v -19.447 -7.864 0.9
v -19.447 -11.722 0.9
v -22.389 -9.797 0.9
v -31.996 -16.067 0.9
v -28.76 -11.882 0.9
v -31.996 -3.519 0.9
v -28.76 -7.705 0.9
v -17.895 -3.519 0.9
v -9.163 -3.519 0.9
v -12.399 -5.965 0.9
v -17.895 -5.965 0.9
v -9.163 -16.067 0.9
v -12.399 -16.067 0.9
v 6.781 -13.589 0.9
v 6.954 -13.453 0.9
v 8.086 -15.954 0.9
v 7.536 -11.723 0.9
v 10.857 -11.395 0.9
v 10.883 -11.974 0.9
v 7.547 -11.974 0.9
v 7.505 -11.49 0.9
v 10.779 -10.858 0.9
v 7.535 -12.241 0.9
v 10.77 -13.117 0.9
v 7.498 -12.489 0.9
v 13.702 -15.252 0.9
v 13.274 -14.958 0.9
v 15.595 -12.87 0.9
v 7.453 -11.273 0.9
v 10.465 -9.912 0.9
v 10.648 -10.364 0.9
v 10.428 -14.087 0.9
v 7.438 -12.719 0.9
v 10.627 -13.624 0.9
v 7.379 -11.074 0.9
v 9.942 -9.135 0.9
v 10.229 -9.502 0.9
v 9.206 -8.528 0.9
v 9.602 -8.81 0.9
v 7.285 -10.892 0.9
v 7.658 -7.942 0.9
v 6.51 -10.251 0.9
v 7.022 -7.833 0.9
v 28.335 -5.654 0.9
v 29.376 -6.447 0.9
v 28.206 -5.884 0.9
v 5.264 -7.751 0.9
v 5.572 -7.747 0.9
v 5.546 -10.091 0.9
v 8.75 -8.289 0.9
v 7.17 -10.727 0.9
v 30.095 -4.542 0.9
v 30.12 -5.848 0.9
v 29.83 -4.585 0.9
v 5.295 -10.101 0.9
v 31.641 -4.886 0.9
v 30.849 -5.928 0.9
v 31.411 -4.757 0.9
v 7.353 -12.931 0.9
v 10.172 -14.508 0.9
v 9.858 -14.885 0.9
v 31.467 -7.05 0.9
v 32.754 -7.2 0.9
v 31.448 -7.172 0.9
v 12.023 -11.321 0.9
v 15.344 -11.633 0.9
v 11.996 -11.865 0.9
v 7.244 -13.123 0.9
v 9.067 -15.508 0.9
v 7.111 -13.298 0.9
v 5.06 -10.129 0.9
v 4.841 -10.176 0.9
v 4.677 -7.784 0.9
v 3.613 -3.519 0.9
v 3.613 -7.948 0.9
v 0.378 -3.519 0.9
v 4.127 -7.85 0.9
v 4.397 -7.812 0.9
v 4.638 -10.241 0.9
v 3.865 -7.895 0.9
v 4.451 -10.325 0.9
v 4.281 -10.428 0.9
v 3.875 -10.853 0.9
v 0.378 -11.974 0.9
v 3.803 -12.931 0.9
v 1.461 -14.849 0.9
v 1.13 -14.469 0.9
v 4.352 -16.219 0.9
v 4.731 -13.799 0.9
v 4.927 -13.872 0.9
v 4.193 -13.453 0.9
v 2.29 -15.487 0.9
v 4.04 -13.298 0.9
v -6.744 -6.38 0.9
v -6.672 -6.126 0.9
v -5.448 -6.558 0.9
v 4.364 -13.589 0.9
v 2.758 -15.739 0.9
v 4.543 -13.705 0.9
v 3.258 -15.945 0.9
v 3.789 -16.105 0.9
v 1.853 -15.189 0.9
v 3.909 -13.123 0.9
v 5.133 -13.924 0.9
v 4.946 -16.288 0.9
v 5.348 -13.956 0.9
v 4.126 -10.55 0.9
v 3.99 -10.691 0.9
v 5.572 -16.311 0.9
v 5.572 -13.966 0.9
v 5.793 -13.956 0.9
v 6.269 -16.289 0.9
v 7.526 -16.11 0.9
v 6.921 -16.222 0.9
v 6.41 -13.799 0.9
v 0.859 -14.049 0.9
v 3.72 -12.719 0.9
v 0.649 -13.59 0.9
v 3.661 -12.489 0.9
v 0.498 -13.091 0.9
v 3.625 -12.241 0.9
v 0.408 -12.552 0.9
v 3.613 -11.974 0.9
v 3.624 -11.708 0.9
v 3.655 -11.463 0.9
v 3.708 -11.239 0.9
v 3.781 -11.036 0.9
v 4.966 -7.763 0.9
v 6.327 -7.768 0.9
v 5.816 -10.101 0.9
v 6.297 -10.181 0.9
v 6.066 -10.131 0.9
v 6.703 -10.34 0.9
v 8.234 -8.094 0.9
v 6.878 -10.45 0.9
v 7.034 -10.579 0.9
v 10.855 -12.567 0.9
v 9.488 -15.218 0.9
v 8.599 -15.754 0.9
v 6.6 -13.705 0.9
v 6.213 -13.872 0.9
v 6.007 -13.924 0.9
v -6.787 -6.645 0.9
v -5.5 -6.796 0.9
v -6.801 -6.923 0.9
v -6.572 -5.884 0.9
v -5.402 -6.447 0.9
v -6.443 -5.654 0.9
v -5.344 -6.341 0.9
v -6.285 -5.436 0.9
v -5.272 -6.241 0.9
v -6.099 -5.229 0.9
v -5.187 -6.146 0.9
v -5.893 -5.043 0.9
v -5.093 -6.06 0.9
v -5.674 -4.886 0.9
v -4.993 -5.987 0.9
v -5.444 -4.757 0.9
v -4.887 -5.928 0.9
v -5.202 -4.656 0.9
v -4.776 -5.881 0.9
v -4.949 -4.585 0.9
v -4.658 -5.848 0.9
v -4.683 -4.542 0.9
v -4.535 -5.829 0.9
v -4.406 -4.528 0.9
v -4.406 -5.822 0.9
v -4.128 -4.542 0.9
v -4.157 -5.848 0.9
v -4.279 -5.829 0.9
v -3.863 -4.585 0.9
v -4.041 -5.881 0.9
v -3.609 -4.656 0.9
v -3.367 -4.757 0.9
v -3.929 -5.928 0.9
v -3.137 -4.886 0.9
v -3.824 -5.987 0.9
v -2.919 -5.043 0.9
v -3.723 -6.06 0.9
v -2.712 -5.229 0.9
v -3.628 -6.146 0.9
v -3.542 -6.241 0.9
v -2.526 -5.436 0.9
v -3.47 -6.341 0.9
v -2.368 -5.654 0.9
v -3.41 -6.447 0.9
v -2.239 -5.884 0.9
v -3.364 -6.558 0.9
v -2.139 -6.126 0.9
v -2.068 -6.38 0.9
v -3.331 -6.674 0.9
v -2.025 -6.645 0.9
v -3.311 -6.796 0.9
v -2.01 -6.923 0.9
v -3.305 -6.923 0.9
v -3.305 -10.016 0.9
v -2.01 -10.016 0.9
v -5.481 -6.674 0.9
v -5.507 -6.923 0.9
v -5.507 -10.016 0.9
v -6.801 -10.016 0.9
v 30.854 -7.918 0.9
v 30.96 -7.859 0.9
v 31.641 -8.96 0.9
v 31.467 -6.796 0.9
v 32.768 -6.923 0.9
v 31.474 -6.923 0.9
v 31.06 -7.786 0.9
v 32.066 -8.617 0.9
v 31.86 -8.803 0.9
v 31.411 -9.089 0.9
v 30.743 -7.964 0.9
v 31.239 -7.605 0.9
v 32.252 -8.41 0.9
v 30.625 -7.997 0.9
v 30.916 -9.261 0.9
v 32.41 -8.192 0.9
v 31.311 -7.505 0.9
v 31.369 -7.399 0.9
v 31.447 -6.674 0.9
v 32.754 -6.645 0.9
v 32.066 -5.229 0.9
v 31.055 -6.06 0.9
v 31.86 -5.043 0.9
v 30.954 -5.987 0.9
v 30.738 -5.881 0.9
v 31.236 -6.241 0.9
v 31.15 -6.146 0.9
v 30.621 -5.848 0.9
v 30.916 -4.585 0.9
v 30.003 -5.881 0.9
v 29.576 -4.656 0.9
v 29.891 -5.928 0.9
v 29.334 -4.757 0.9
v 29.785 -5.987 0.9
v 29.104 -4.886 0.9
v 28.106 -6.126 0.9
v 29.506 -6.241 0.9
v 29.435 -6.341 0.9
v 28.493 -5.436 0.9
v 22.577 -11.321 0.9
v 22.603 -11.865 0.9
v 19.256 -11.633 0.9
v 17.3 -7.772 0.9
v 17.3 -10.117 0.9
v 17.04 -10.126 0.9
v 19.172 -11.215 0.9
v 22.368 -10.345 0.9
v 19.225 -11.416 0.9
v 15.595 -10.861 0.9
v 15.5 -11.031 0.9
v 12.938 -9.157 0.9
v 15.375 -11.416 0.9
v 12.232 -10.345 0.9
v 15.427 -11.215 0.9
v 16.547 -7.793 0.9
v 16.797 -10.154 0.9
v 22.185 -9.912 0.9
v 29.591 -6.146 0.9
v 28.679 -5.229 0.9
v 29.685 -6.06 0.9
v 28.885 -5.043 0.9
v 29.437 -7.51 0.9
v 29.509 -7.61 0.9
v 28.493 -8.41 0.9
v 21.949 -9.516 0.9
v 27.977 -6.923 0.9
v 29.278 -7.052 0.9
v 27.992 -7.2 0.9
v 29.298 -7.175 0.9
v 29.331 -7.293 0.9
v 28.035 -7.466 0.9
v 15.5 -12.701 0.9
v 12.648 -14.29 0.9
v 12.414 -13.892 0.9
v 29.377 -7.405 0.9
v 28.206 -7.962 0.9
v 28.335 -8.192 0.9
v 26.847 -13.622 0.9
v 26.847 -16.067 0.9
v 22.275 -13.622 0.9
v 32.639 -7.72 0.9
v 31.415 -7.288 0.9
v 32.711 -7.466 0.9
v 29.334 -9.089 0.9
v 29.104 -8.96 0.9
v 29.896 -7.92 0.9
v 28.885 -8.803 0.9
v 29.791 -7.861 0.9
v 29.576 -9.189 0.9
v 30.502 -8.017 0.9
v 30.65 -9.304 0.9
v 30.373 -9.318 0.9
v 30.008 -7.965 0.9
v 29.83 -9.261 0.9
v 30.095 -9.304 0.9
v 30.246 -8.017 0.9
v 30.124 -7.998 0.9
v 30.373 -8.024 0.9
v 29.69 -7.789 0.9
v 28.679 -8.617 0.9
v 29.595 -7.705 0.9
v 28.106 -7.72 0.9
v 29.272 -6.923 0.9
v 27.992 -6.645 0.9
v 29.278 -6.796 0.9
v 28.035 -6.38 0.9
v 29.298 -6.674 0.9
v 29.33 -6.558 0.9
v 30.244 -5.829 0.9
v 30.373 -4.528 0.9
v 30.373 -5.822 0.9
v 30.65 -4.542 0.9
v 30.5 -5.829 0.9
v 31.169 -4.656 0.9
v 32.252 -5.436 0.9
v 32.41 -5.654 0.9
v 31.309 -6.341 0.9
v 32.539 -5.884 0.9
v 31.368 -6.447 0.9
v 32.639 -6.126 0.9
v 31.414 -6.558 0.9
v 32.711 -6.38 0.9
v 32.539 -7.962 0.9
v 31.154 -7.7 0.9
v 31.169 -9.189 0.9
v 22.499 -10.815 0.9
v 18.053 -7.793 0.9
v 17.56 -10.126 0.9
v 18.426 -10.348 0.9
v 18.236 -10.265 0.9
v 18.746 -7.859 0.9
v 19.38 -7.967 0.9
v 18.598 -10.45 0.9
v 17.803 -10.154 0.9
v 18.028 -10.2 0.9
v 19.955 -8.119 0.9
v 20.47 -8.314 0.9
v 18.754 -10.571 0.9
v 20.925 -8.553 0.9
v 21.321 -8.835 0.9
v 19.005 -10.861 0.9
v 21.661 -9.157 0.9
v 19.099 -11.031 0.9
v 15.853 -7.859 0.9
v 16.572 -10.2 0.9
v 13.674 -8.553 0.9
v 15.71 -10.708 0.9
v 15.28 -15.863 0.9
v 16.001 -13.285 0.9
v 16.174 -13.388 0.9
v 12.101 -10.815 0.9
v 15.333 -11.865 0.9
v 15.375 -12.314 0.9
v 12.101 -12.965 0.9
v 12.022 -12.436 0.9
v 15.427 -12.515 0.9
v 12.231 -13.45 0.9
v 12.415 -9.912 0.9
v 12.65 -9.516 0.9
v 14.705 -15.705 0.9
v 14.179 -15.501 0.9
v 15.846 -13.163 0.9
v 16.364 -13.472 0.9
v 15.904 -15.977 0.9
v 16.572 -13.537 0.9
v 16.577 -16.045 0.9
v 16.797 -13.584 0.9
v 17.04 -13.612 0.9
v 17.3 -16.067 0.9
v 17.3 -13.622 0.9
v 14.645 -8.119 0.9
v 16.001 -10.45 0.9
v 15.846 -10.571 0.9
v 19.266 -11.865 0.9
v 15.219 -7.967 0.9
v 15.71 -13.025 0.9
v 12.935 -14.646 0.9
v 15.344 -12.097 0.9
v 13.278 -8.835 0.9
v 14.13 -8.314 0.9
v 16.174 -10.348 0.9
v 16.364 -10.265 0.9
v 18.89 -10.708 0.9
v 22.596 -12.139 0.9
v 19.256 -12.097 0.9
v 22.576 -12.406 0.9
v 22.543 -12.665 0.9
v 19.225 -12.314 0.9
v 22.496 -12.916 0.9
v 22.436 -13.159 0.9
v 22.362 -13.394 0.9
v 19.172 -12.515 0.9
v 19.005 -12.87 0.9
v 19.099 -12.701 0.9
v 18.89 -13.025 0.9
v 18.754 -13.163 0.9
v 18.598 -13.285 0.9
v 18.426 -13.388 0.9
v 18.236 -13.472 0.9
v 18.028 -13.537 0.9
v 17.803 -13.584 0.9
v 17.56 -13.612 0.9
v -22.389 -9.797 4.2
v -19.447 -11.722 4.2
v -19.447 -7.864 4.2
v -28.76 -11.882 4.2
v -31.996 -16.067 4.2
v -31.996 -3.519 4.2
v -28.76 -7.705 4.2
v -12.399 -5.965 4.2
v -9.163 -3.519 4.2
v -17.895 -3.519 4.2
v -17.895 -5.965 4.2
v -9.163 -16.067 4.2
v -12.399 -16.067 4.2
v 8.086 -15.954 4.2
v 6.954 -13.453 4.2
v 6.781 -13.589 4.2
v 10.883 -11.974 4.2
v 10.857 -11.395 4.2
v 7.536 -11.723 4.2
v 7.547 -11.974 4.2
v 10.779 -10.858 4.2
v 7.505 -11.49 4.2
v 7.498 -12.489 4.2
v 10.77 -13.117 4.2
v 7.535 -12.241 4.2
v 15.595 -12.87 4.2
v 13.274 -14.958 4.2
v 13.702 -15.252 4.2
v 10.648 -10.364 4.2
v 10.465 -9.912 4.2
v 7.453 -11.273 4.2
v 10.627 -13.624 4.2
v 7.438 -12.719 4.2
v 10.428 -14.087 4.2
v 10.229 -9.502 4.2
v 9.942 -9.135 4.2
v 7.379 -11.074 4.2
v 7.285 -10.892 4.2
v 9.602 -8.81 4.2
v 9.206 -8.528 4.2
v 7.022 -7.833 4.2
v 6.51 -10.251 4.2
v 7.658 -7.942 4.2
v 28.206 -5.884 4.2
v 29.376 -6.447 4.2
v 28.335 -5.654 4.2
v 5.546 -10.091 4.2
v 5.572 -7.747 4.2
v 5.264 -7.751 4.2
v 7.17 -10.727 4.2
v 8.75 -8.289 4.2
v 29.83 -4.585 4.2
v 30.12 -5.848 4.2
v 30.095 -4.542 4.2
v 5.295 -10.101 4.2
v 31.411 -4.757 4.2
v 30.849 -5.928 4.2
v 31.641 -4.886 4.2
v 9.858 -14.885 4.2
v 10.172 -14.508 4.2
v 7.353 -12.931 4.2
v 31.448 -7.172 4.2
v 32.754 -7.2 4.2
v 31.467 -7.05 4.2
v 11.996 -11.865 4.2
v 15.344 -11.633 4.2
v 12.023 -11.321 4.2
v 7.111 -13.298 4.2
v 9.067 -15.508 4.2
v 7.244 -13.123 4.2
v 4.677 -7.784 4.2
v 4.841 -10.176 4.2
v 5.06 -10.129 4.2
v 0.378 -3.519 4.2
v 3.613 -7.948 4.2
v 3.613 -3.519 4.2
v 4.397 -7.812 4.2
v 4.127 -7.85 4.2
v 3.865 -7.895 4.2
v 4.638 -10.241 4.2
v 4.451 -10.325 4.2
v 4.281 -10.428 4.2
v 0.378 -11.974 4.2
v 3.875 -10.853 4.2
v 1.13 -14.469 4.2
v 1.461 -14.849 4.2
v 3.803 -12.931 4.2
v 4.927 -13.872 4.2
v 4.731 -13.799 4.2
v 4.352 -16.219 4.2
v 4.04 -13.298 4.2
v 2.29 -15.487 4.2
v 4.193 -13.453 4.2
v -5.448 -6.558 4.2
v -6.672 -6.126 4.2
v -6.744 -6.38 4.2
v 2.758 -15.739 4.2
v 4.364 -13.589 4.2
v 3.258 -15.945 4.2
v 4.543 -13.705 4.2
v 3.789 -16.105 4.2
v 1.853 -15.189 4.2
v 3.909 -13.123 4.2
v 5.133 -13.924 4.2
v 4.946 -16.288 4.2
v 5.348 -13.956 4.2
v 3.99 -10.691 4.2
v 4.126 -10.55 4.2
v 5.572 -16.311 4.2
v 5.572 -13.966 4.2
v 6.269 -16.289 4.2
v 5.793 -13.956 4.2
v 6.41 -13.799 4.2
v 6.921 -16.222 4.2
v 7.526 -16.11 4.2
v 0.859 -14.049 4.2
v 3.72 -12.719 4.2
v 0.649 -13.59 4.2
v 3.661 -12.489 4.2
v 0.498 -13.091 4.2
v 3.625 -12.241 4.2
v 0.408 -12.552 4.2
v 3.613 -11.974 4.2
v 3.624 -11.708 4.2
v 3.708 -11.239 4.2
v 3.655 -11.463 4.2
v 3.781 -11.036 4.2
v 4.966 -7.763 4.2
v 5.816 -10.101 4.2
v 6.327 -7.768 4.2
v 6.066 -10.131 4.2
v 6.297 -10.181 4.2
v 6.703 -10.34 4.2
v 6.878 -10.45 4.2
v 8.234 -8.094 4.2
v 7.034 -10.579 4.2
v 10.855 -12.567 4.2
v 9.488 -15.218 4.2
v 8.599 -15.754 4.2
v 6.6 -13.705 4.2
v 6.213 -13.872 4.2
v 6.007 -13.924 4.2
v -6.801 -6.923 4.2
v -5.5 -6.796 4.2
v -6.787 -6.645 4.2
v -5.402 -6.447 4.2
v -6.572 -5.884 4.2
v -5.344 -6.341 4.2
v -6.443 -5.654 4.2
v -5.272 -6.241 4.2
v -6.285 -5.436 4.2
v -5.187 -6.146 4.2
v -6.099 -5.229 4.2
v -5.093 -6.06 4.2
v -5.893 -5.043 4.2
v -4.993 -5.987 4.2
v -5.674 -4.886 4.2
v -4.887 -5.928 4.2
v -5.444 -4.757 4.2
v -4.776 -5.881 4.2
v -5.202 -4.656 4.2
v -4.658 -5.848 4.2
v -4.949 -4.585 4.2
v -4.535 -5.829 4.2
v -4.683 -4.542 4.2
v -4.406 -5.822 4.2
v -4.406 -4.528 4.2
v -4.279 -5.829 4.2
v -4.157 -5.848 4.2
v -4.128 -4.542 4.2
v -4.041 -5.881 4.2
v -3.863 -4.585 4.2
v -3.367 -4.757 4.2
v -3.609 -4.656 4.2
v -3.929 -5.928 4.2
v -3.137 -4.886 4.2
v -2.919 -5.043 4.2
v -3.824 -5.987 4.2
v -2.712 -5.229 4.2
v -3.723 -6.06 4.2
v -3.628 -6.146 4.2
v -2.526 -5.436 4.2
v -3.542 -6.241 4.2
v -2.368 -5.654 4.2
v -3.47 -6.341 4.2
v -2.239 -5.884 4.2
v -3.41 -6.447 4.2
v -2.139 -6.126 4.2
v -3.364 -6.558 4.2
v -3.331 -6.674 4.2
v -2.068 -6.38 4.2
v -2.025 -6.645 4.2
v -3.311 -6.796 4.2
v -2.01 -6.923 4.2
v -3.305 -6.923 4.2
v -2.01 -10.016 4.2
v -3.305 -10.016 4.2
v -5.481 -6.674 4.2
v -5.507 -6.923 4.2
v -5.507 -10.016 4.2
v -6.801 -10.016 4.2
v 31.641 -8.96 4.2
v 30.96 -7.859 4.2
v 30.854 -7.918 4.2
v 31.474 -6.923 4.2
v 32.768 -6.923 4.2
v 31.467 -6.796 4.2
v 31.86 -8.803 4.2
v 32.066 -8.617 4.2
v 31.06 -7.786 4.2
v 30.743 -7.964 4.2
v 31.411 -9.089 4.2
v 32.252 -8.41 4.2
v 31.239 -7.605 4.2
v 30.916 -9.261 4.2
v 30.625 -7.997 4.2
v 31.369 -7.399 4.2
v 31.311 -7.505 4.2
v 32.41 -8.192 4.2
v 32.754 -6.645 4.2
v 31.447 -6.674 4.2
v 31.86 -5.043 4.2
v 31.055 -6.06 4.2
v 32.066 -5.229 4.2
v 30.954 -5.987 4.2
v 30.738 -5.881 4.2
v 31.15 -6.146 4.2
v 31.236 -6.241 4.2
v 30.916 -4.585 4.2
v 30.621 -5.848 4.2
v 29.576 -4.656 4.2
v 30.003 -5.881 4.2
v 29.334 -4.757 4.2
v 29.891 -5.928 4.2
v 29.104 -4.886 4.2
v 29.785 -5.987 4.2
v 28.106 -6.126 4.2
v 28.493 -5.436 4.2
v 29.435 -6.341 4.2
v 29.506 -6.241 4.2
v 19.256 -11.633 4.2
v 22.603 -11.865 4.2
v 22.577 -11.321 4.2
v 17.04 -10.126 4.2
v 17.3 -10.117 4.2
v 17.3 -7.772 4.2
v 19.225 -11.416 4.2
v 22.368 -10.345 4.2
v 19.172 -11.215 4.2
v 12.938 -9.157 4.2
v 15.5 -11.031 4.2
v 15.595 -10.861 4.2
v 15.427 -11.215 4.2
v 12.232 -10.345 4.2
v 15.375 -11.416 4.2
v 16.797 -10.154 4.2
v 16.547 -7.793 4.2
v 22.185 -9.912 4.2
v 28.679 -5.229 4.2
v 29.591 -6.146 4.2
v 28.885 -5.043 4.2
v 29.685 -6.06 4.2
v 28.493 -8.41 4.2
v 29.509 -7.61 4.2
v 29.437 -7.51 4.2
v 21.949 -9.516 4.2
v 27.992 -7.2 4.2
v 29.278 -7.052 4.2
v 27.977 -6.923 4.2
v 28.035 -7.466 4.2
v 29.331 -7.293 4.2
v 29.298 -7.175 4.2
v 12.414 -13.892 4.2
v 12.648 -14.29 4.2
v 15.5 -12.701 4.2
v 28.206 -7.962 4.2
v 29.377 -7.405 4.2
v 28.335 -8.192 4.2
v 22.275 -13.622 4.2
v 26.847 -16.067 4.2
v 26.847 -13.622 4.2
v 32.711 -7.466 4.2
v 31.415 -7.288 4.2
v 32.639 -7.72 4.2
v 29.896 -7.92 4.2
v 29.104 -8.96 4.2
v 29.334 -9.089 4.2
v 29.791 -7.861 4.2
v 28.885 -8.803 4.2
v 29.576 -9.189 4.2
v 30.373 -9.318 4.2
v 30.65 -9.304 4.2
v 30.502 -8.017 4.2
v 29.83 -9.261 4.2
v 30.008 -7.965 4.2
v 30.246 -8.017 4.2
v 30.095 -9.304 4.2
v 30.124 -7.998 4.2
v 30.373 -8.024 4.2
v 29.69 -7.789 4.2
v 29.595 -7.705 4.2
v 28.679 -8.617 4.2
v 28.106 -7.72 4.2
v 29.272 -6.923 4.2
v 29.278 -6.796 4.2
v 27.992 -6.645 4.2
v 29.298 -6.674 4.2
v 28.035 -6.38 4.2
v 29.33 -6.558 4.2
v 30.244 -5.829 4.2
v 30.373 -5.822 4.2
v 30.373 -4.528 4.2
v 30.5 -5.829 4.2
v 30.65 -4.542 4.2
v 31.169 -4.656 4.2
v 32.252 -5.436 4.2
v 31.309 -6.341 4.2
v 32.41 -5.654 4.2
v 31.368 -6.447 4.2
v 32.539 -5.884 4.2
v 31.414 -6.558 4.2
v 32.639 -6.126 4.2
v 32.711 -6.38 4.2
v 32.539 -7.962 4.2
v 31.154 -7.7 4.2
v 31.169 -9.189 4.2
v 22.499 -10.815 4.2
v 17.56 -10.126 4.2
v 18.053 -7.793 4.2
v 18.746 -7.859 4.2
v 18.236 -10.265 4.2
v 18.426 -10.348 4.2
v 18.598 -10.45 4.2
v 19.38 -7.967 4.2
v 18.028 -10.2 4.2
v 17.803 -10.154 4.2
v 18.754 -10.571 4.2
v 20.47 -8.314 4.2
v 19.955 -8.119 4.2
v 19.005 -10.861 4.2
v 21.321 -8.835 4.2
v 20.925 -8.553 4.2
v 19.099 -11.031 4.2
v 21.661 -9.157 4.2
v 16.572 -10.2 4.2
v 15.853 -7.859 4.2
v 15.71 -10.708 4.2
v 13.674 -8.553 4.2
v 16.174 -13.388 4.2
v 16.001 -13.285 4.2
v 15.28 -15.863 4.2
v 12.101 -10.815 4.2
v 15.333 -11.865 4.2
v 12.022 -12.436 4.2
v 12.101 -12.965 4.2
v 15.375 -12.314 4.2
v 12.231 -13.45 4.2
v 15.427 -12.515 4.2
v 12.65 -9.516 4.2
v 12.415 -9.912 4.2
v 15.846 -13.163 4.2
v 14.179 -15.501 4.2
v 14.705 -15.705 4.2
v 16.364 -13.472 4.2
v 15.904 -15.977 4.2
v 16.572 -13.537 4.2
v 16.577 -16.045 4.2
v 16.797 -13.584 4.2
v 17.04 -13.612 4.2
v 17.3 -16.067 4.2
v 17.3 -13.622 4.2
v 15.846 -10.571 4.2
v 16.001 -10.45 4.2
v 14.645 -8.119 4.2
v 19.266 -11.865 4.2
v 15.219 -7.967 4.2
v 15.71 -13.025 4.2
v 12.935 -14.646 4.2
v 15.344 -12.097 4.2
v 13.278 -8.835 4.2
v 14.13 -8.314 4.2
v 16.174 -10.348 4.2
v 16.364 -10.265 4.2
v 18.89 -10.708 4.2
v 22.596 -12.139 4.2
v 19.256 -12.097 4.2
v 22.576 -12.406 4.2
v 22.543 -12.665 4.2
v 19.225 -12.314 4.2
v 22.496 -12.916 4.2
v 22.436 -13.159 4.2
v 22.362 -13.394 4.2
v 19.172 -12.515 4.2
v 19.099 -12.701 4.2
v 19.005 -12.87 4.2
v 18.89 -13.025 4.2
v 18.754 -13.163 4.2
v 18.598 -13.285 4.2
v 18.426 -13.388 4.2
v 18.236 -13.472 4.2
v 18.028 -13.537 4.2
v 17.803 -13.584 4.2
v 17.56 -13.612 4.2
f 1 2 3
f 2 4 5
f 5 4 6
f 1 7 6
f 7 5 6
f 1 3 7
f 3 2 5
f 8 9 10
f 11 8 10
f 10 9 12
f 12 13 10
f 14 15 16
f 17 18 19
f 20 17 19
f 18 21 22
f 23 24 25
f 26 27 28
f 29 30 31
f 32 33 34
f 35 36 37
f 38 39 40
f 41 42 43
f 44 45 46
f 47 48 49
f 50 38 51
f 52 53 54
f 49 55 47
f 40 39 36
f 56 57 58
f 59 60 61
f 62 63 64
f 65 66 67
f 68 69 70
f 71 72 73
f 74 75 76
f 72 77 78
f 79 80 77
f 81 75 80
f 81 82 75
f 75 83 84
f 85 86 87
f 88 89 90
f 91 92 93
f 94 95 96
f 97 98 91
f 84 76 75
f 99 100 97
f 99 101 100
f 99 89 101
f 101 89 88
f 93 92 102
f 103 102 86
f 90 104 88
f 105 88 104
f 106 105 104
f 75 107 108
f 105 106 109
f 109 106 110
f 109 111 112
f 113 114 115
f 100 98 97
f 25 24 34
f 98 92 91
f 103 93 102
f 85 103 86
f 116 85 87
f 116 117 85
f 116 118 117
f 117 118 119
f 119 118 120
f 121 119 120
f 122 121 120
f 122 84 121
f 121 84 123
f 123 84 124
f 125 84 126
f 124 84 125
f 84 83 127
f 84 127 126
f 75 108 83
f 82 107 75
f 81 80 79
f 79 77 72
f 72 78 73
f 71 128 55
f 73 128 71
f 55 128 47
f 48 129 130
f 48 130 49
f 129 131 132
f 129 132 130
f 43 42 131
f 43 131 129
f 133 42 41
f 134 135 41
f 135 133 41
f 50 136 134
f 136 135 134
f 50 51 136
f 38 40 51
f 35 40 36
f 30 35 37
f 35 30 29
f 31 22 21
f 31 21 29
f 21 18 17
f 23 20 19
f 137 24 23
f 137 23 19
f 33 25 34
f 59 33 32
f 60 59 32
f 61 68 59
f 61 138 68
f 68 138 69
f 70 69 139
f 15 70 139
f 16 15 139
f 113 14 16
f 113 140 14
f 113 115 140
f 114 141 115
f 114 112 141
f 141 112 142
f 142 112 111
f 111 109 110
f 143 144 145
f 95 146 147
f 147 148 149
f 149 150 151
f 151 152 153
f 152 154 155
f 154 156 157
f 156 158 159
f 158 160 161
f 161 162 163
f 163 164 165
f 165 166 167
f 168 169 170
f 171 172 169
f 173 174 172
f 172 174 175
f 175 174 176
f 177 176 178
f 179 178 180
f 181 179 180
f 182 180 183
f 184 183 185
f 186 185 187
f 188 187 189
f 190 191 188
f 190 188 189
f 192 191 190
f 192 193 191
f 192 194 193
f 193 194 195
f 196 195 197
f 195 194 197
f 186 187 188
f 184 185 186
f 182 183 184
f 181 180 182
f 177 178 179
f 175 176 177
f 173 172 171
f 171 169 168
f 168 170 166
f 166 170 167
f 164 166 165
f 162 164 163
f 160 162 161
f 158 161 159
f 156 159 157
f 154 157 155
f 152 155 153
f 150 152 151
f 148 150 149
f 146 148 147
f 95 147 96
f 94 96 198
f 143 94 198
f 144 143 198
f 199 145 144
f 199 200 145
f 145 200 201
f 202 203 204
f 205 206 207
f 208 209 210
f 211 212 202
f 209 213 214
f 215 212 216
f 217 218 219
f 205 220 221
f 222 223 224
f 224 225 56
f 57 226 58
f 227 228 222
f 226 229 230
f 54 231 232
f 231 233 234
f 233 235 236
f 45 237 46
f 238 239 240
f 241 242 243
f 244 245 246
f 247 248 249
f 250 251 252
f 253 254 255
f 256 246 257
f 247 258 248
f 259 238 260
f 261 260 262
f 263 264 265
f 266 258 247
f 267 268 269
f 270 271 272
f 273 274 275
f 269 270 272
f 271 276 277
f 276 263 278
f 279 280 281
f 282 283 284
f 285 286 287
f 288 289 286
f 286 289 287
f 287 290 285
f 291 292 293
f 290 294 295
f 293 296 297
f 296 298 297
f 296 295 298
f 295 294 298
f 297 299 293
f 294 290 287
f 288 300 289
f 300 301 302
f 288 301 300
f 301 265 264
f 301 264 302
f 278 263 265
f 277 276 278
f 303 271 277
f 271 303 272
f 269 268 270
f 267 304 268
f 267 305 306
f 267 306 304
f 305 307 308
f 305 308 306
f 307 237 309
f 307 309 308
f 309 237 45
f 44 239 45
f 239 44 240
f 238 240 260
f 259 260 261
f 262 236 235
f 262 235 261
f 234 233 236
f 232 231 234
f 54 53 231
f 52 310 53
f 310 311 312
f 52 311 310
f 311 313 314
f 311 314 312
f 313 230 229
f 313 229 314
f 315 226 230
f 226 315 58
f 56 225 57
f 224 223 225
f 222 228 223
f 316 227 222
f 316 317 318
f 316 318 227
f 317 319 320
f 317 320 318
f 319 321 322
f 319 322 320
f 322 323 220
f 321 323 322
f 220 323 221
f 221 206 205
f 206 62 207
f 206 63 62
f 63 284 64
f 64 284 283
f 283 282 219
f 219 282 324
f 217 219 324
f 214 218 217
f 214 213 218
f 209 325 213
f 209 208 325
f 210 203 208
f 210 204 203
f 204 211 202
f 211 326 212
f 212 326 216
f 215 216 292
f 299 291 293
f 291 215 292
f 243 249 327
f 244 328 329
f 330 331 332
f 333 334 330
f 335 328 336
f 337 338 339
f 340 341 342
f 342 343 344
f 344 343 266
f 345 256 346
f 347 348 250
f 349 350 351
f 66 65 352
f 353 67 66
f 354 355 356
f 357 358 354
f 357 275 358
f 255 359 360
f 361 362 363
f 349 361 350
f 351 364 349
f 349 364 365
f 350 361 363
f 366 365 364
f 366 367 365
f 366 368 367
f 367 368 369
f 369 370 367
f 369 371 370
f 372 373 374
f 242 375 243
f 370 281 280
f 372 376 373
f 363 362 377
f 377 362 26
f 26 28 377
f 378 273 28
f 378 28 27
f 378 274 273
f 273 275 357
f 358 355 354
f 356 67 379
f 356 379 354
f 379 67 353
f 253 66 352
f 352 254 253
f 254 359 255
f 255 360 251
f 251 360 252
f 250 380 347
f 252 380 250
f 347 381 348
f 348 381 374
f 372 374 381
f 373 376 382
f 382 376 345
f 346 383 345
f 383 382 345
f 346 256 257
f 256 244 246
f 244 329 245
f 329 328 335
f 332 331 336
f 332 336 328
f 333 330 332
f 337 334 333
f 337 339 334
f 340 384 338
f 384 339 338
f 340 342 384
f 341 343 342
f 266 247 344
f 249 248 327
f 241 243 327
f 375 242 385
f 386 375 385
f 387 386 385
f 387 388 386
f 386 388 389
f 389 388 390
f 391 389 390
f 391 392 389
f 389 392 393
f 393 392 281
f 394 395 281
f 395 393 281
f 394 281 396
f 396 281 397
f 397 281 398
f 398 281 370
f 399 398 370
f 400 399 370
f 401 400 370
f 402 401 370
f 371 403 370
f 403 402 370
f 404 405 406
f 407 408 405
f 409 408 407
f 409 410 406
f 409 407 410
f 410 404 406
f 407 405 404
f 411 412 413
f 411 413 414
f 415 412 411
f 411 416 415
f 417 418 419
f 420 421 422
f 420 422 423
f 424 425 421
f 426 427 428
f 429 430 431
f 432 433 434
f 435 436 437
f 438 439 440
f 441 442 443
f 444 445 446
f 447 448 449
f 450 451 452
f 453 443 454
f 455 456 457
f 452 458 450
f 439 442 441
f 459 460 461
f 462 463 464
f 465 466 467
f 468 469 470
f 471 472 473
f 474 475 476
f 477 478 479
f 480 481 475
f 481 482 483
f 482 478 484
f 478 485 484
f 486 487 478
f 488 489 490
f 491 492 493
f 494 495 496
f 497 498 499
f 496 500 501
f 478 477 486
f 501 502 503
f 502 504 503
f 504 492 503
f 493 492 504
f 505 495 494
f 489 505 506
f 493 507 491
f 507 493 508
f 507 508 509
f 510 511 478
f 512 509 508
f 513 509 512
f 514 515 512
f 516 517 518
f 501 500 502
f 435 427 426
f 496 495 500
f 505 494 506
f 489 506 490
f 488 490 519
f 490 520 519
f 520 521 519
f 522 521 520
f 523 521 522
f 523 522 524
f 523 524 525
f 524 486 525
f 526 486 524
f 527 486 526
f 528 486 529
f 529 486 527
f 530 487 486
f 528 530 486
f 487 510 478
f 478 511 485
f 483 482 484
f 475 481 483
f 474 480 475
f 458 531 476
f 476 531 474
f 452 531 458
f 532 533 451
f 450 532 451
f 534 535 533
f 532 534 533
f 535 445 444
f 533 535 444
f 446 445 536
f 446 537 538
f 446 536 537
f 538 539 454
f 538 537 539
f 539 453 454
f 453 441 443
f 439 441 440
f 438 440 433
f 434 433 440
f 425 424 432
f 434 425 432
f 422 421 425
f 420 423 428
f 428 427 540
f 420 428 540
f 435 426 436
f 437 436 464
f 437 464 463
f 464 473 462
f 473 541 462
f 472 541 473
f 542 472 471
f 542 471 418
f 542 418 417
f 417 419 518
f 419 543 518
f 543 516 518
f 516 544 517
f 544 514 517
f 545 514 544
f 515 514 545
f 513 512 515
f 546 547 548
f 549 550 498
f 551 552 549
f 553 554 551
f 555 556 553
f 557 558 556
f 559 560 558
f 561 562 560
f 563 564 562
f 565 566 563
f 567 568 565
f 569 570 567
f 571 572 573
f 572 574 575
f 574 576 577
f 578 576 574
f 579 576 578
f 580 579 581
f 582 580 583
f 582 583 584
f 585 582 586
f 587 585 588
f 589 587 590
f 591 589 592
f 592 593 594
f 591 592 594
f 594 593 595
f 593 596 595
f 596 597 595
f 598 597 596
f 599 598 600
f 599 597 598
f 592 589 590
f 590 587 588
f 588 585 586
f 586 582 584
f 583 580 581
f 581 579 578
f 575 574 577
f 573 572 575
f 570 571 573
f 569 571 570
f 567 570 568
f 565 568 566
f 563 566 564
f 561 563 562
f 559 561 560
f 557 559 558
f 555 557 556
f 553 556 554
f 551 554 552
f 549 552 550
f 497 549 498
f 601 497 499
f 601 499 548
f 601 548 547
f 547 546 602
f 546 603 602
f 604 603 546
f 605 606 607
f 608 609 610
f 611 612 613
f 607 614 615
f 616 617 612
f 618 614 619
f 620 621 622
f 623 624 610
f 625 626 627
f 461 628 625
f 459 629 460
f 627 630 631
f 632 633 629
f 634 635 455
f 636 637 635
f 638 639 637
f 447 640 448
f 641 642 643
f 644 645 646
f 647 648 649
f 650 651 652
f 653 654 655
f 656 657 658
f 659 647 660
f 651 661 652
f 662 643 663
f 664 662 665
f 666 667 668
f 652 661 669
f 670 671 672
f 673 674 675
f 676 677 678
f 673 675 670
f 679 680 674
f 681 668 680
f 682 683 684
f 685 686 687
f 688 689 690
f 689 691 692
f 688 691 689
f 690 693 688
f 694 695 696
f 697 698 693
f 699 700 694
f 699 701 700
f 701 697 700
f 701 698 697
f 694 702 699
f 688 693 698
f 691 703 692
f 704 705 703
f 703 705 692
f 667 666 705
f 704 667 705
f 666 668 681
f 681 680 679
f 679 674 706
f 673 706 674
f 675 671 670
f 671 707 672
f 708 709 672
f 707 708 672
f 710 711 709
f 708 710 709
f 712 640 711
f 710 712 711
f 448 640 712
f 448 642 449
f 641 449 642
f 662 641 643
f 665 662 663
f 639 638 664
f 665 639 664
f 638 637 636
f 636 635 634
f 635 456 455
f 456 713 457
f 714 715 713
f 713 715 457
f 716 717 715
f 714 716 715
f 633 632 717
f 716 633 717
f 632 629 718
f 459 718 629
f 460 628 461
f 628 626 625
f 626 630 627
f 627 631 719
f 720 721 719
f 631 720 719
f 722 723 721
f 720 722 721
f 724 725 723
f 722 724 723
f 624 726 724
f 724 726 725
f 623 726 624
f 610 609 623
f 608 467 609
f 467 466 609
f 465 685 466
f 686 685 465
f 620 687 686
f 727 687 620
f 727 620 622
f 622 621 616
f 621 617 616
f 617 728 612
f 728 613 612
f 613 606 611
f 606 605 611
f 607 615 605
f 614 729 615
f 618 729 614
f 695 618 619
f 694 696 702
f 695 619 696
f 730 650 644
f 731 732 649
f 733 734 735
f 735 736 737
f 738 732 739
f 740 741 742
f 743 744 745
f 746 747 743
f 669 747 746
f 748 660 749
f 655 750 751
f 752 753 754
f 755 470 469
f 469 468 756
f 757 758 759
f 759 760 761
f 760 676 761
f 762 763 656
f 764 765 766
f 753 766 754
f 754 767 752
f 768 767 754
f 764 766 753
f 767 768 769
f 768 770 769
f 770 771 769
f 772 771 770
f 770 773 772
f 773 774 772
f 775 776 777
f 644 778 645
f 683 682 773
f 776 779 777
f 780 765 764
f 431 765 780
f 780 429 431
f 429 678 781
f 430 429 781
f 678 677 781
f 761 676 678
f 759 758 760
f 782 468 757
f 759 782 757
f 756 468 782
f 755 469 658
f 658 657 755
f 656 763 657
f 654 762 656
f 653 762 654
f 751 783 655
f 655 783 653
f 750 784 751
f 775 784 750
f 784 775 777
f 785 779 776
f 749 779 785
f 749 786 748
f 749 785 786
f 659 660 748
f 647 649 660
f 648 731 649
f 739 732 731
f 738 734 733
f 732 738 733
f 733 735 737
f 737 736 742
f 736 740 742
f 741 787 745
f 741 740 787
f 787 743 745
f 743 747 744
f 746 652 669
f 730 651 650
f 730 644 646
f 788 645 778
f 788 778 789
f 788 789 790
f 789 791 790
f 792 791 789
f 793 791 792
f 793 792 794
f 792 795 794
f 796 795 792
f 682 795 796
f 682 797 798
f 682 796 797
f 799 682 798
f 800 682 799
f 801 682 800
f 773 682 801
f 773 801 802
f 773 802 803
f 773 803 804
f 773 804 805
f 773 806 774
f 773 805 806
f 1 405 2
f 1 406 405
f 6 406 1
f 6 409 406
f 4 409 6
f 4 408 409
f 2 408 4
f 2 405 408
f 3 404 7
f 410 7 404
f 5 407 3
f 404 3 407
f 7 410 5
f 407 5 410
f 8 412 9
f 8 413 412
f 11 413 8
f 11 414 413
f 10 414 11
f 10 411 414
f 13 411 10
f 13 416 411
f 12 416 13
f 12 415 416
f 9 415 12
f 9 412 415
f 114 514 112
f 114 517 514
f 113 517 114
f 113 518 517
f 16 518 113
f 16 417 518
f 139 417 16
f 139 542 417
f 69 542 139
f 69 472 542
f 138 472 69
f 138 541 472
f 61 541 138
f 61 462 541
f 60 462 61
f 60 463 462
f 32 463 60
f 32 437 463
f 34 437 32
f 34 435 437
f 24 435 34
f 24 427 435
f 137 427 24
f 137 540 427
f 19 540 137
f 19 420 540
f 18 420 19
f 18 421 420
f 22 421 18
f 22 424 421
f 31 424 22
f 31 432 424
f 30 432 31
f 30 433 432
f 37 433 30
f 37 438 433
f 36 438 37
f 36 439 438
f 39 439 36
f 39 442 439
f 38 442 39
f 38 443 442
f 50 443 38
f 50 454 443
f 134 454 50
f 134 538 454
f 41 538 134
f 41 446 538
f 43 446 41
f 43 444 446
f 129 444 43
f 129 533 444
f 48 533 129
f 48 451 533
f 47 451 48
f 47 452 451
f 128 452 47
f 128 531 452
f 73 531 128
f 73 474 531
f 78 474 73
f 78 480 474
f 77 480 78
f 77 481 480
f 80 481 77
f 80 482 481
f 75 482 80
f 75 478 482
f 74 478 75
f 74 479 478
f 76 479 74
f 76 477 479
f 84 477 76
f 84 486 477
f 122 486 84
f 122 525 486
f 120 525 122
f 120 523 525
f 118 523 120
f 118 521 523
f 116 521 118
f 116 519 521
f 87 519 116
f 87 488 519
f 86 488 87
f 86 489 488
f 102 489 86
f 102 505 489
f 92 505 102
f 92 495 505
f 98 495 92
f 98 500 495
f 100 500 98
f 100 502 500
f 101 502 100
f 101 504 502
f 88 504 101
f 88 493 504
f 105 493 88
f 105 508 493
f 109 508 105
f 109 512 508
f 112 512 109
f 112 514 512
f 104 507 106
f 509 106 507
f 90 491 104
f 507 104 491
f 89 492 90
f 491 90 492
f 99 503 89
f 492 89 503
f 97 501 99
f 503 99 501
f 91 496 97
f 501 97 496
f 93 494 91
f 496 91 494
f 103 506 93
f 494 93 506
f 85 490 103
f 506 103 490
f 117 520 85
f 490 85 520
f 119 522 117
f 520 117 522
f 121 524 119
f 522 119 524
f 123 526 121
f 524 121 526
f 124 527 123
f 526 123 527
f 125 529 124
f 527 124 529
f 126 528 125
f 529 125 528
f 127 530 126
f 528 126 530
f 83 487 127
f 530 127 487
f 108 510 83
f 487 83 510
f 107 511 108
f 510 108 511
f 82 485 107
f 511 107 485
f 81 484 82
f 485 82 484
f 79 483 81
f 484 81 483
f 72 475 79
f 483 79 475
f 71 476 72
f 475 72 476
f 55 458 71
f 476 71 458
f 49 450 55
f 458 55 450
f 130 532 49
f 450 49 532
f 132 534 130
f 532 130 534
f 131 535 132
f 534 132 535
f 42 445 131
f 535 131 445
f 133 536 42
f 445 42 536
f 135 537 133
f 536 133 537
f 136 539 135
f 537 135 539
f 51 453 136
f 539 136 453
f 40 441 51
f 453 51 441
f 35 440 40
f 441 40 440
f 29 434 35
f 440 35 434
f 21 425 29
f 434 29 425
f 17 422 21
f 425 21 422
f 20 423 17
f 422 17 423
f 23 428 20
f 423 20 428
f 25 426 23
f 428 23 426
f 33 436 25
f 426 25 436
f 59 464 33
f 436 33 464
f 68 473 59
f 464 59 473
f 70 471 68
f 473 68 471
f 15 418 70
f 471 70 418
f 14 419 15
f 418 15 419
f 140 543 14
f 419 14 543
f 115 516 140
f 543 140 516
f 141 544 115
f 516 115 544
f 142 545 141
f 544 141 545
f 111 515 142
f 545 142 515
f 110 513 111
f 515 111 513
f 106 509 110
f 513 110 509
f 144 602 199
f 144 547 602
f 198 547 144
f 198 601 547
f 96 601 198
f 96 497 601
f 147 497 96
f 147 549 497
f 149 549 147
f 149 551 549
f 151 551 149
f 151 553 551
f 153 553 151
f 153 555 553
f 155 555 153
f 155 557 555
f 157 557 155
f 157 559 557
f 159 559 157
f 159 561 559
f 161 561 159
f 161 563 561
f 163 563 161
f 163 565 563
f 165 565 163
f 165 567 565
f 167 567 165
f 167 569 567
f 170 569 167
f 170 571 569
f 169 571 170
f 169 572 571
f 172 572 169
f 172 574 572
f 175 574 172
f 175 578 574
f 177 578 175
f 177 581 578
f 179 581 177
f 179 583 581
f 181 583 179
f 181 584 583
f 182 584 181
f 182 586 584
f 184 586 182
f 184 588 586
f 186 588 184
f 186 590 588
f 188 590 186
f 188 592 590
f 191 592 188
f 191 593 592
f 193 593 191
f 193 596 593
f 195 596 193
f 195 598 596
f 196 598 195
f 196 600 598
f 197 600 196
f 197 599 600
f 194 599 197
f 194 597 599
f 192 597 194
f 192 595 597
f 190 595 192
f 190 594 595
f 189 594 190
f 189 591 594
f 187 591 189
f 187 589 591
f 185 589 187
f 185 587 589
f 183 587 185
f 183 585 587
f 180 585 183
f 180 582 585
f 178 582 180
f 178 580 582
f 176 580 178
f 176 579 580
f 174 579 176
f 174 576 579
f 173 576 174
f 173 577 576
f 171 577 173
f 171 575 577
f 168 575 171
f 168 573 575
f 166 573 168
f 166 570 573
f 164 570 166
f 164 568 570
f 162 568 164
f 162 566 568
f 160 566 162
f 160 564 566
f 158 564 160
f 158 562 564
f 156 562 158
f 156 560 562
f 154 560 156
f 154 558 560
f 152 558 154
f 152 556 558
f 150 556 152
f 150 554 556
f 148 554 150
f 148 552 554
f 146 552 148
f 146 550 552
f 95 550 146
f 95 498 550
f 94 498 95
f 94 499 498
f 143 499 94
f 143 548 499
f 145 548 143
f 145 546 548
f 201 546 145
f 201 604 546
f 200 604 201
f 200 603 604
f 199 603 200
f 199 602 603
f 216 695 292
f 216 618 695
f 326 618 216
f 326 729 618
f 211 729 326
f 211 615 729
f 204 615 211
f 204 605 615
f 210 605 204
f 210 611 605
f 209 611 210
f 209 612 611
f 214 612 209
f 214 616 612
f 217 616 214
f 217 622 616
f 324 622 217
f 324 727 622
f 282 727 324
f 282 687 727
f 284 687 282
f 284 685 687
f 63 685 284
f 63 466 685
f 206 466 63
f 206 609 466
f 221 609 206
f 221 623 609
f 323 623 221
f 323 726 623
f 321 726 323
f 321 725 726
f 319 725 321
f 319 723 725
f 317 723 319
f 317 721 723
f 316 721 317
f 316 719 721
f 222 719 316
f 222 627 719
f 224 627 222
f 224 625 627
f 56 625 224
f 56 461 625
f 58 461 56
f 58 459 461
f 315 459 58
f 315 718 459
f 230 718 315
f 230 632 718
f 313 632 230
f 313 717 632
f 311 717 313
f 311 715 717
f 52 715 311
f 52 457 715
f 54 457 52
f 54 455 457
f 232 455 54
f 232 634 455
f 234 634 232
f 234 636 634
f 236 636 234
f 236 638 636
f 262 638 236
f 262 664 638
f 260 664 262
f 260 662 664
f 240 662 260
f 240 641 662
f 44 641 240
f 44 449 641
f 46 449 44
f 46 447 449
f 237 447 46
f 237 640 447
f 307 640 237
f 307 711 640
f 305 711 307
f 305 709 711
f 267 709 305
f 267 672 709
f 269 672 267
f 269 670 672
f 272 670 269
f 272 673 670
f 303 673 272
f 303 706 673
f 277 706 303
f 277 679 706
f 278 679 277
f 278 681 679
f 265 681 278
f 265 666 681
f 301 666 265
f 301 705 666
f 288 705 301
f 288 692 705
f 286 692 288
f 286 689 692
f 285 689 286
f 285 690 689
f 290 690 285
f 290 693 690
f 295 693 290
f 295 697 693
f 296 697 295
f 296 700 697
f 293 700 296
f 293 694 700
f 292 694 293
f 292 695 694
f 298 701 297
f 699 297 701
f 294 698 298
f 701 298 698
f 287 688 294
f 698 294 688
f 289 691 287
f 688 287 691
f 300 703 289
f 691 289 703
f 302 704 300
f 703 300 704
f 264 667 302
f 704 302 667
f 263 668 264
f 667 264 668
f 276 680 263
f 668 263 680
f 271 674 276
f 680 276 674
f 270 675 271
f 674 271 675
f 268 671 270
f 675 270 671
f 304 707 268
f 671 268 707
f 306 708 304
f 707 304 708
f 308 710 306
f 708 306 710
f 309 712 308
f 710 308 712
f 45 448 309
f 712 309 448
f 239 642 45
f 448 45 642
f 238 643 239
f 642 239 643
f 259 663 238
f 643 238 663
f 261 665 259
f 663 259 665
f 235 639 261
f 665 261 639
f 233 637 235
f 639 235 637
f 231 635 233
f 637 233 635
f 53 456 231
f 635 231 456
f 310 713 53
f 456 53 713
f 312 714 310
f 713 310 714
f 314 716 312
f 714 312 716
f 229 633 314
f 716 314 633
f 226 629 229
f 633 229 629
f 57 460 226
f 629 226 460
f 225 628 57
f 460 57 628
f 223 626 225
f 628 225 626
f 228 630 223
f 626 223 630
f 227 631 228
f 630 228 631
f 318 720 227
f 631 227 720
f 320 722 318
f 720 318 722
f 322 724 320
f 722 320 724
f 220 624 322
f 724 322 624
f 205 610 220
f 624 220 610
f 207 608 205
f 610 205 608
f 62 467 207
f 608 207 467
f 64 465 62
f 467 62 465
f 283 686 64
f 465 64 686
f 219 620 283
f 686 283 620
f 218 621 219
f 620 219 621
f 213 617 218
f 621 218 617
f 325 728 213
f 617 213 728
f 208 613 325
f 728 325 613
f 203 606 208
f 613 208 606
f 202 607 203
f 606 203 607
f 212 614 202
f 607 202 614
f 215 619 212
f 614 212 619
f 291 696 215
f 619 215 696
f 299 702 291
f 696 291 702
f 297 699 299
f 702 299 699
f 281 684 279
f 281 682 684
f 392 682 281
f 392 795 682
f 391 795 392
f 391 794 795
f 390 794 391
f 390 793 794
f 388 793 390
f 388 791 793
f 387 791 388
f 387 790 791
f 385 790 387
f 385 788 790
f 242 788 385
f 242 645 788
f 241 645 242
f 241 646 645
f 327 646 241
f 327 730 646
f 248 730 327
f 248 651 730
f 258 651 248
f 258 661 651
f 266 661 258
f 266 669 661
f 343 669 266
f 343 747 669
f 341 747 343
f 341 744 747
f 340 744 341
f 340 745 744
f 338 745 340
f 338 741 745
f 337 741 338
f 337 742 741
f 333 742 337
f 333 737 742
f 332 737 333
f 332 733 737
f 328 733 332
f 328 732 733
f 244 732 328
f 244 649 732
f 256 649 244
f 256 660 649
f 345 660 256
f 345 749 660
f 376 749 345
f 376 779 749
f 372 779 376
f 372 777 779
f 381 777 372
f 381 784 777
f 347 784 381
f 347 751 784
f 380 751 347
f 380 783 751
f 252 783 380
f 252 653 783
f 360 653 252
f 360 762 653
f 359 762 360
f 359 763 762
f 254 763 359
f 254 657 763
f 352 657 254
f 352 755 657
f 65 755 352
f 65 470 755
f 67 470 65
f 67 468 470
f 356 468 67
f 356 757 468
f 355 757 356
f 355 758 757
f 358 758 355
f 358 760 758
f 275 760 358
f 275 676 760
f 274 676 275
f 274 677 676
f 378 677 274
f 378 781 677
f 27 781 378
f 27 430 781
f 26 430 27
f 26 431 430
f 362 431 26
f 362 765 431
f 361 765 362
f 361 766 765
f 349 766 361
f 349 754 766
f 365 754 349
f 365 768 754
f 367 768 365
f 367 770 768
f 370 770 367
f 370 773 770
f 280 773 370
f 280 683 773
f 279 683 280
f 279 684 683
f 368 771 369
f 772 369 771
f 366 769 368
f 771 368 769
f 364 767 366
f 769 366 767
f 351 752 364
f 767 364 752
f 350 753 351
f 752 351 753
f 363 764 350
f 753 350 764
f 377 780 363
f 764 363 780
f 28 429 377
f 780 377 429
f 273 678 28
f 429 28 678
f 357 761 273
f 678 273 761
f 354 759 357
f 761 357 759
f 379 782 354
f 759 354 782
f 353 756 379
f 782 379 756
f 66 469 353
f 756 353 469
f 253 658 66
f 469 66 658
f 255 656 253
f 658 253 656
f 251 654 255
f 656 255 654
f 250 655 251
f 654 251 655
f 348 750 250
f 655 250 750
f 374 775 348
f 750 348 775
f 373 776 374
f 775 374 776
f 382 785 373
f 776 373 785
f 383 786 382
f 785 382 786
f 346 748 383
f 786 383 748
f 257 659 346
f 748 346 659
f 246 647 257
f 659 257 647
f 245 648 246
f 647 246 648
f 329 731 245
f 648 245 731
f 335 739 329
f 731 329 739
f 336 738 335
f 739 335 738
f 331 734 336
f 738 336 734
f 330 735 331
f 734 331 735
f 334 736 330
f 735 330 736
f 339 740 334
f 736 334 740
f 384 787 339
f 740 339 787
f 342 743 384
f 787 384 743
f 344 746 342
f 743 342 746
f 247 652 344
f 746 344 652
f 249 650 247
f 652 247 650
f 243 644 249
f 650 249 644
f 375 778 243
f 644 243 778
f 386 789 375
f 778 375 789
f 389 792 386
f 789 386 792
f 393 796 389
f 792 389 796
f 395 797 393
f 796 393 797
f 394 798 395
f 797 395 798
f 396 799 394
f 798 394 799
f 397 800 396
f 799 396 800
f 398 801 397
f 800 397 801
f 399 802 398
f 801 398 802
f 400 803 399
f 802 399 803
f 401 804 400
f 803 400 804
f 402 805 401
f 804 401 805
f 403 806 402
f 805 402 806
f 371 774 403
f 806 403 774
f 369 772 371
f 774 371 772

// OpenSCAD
$fn = 48;
  // syllabics (overlaid on icon, tallest) — row 2
  translate([0, -10.060, 0.900]) linear_extrude(height=3.300) text("ᐅᒣᐢᑲᓇᐤ", size=12.394, halign="center", valign="center", font="Euphemia UCAS:style=Bold");
